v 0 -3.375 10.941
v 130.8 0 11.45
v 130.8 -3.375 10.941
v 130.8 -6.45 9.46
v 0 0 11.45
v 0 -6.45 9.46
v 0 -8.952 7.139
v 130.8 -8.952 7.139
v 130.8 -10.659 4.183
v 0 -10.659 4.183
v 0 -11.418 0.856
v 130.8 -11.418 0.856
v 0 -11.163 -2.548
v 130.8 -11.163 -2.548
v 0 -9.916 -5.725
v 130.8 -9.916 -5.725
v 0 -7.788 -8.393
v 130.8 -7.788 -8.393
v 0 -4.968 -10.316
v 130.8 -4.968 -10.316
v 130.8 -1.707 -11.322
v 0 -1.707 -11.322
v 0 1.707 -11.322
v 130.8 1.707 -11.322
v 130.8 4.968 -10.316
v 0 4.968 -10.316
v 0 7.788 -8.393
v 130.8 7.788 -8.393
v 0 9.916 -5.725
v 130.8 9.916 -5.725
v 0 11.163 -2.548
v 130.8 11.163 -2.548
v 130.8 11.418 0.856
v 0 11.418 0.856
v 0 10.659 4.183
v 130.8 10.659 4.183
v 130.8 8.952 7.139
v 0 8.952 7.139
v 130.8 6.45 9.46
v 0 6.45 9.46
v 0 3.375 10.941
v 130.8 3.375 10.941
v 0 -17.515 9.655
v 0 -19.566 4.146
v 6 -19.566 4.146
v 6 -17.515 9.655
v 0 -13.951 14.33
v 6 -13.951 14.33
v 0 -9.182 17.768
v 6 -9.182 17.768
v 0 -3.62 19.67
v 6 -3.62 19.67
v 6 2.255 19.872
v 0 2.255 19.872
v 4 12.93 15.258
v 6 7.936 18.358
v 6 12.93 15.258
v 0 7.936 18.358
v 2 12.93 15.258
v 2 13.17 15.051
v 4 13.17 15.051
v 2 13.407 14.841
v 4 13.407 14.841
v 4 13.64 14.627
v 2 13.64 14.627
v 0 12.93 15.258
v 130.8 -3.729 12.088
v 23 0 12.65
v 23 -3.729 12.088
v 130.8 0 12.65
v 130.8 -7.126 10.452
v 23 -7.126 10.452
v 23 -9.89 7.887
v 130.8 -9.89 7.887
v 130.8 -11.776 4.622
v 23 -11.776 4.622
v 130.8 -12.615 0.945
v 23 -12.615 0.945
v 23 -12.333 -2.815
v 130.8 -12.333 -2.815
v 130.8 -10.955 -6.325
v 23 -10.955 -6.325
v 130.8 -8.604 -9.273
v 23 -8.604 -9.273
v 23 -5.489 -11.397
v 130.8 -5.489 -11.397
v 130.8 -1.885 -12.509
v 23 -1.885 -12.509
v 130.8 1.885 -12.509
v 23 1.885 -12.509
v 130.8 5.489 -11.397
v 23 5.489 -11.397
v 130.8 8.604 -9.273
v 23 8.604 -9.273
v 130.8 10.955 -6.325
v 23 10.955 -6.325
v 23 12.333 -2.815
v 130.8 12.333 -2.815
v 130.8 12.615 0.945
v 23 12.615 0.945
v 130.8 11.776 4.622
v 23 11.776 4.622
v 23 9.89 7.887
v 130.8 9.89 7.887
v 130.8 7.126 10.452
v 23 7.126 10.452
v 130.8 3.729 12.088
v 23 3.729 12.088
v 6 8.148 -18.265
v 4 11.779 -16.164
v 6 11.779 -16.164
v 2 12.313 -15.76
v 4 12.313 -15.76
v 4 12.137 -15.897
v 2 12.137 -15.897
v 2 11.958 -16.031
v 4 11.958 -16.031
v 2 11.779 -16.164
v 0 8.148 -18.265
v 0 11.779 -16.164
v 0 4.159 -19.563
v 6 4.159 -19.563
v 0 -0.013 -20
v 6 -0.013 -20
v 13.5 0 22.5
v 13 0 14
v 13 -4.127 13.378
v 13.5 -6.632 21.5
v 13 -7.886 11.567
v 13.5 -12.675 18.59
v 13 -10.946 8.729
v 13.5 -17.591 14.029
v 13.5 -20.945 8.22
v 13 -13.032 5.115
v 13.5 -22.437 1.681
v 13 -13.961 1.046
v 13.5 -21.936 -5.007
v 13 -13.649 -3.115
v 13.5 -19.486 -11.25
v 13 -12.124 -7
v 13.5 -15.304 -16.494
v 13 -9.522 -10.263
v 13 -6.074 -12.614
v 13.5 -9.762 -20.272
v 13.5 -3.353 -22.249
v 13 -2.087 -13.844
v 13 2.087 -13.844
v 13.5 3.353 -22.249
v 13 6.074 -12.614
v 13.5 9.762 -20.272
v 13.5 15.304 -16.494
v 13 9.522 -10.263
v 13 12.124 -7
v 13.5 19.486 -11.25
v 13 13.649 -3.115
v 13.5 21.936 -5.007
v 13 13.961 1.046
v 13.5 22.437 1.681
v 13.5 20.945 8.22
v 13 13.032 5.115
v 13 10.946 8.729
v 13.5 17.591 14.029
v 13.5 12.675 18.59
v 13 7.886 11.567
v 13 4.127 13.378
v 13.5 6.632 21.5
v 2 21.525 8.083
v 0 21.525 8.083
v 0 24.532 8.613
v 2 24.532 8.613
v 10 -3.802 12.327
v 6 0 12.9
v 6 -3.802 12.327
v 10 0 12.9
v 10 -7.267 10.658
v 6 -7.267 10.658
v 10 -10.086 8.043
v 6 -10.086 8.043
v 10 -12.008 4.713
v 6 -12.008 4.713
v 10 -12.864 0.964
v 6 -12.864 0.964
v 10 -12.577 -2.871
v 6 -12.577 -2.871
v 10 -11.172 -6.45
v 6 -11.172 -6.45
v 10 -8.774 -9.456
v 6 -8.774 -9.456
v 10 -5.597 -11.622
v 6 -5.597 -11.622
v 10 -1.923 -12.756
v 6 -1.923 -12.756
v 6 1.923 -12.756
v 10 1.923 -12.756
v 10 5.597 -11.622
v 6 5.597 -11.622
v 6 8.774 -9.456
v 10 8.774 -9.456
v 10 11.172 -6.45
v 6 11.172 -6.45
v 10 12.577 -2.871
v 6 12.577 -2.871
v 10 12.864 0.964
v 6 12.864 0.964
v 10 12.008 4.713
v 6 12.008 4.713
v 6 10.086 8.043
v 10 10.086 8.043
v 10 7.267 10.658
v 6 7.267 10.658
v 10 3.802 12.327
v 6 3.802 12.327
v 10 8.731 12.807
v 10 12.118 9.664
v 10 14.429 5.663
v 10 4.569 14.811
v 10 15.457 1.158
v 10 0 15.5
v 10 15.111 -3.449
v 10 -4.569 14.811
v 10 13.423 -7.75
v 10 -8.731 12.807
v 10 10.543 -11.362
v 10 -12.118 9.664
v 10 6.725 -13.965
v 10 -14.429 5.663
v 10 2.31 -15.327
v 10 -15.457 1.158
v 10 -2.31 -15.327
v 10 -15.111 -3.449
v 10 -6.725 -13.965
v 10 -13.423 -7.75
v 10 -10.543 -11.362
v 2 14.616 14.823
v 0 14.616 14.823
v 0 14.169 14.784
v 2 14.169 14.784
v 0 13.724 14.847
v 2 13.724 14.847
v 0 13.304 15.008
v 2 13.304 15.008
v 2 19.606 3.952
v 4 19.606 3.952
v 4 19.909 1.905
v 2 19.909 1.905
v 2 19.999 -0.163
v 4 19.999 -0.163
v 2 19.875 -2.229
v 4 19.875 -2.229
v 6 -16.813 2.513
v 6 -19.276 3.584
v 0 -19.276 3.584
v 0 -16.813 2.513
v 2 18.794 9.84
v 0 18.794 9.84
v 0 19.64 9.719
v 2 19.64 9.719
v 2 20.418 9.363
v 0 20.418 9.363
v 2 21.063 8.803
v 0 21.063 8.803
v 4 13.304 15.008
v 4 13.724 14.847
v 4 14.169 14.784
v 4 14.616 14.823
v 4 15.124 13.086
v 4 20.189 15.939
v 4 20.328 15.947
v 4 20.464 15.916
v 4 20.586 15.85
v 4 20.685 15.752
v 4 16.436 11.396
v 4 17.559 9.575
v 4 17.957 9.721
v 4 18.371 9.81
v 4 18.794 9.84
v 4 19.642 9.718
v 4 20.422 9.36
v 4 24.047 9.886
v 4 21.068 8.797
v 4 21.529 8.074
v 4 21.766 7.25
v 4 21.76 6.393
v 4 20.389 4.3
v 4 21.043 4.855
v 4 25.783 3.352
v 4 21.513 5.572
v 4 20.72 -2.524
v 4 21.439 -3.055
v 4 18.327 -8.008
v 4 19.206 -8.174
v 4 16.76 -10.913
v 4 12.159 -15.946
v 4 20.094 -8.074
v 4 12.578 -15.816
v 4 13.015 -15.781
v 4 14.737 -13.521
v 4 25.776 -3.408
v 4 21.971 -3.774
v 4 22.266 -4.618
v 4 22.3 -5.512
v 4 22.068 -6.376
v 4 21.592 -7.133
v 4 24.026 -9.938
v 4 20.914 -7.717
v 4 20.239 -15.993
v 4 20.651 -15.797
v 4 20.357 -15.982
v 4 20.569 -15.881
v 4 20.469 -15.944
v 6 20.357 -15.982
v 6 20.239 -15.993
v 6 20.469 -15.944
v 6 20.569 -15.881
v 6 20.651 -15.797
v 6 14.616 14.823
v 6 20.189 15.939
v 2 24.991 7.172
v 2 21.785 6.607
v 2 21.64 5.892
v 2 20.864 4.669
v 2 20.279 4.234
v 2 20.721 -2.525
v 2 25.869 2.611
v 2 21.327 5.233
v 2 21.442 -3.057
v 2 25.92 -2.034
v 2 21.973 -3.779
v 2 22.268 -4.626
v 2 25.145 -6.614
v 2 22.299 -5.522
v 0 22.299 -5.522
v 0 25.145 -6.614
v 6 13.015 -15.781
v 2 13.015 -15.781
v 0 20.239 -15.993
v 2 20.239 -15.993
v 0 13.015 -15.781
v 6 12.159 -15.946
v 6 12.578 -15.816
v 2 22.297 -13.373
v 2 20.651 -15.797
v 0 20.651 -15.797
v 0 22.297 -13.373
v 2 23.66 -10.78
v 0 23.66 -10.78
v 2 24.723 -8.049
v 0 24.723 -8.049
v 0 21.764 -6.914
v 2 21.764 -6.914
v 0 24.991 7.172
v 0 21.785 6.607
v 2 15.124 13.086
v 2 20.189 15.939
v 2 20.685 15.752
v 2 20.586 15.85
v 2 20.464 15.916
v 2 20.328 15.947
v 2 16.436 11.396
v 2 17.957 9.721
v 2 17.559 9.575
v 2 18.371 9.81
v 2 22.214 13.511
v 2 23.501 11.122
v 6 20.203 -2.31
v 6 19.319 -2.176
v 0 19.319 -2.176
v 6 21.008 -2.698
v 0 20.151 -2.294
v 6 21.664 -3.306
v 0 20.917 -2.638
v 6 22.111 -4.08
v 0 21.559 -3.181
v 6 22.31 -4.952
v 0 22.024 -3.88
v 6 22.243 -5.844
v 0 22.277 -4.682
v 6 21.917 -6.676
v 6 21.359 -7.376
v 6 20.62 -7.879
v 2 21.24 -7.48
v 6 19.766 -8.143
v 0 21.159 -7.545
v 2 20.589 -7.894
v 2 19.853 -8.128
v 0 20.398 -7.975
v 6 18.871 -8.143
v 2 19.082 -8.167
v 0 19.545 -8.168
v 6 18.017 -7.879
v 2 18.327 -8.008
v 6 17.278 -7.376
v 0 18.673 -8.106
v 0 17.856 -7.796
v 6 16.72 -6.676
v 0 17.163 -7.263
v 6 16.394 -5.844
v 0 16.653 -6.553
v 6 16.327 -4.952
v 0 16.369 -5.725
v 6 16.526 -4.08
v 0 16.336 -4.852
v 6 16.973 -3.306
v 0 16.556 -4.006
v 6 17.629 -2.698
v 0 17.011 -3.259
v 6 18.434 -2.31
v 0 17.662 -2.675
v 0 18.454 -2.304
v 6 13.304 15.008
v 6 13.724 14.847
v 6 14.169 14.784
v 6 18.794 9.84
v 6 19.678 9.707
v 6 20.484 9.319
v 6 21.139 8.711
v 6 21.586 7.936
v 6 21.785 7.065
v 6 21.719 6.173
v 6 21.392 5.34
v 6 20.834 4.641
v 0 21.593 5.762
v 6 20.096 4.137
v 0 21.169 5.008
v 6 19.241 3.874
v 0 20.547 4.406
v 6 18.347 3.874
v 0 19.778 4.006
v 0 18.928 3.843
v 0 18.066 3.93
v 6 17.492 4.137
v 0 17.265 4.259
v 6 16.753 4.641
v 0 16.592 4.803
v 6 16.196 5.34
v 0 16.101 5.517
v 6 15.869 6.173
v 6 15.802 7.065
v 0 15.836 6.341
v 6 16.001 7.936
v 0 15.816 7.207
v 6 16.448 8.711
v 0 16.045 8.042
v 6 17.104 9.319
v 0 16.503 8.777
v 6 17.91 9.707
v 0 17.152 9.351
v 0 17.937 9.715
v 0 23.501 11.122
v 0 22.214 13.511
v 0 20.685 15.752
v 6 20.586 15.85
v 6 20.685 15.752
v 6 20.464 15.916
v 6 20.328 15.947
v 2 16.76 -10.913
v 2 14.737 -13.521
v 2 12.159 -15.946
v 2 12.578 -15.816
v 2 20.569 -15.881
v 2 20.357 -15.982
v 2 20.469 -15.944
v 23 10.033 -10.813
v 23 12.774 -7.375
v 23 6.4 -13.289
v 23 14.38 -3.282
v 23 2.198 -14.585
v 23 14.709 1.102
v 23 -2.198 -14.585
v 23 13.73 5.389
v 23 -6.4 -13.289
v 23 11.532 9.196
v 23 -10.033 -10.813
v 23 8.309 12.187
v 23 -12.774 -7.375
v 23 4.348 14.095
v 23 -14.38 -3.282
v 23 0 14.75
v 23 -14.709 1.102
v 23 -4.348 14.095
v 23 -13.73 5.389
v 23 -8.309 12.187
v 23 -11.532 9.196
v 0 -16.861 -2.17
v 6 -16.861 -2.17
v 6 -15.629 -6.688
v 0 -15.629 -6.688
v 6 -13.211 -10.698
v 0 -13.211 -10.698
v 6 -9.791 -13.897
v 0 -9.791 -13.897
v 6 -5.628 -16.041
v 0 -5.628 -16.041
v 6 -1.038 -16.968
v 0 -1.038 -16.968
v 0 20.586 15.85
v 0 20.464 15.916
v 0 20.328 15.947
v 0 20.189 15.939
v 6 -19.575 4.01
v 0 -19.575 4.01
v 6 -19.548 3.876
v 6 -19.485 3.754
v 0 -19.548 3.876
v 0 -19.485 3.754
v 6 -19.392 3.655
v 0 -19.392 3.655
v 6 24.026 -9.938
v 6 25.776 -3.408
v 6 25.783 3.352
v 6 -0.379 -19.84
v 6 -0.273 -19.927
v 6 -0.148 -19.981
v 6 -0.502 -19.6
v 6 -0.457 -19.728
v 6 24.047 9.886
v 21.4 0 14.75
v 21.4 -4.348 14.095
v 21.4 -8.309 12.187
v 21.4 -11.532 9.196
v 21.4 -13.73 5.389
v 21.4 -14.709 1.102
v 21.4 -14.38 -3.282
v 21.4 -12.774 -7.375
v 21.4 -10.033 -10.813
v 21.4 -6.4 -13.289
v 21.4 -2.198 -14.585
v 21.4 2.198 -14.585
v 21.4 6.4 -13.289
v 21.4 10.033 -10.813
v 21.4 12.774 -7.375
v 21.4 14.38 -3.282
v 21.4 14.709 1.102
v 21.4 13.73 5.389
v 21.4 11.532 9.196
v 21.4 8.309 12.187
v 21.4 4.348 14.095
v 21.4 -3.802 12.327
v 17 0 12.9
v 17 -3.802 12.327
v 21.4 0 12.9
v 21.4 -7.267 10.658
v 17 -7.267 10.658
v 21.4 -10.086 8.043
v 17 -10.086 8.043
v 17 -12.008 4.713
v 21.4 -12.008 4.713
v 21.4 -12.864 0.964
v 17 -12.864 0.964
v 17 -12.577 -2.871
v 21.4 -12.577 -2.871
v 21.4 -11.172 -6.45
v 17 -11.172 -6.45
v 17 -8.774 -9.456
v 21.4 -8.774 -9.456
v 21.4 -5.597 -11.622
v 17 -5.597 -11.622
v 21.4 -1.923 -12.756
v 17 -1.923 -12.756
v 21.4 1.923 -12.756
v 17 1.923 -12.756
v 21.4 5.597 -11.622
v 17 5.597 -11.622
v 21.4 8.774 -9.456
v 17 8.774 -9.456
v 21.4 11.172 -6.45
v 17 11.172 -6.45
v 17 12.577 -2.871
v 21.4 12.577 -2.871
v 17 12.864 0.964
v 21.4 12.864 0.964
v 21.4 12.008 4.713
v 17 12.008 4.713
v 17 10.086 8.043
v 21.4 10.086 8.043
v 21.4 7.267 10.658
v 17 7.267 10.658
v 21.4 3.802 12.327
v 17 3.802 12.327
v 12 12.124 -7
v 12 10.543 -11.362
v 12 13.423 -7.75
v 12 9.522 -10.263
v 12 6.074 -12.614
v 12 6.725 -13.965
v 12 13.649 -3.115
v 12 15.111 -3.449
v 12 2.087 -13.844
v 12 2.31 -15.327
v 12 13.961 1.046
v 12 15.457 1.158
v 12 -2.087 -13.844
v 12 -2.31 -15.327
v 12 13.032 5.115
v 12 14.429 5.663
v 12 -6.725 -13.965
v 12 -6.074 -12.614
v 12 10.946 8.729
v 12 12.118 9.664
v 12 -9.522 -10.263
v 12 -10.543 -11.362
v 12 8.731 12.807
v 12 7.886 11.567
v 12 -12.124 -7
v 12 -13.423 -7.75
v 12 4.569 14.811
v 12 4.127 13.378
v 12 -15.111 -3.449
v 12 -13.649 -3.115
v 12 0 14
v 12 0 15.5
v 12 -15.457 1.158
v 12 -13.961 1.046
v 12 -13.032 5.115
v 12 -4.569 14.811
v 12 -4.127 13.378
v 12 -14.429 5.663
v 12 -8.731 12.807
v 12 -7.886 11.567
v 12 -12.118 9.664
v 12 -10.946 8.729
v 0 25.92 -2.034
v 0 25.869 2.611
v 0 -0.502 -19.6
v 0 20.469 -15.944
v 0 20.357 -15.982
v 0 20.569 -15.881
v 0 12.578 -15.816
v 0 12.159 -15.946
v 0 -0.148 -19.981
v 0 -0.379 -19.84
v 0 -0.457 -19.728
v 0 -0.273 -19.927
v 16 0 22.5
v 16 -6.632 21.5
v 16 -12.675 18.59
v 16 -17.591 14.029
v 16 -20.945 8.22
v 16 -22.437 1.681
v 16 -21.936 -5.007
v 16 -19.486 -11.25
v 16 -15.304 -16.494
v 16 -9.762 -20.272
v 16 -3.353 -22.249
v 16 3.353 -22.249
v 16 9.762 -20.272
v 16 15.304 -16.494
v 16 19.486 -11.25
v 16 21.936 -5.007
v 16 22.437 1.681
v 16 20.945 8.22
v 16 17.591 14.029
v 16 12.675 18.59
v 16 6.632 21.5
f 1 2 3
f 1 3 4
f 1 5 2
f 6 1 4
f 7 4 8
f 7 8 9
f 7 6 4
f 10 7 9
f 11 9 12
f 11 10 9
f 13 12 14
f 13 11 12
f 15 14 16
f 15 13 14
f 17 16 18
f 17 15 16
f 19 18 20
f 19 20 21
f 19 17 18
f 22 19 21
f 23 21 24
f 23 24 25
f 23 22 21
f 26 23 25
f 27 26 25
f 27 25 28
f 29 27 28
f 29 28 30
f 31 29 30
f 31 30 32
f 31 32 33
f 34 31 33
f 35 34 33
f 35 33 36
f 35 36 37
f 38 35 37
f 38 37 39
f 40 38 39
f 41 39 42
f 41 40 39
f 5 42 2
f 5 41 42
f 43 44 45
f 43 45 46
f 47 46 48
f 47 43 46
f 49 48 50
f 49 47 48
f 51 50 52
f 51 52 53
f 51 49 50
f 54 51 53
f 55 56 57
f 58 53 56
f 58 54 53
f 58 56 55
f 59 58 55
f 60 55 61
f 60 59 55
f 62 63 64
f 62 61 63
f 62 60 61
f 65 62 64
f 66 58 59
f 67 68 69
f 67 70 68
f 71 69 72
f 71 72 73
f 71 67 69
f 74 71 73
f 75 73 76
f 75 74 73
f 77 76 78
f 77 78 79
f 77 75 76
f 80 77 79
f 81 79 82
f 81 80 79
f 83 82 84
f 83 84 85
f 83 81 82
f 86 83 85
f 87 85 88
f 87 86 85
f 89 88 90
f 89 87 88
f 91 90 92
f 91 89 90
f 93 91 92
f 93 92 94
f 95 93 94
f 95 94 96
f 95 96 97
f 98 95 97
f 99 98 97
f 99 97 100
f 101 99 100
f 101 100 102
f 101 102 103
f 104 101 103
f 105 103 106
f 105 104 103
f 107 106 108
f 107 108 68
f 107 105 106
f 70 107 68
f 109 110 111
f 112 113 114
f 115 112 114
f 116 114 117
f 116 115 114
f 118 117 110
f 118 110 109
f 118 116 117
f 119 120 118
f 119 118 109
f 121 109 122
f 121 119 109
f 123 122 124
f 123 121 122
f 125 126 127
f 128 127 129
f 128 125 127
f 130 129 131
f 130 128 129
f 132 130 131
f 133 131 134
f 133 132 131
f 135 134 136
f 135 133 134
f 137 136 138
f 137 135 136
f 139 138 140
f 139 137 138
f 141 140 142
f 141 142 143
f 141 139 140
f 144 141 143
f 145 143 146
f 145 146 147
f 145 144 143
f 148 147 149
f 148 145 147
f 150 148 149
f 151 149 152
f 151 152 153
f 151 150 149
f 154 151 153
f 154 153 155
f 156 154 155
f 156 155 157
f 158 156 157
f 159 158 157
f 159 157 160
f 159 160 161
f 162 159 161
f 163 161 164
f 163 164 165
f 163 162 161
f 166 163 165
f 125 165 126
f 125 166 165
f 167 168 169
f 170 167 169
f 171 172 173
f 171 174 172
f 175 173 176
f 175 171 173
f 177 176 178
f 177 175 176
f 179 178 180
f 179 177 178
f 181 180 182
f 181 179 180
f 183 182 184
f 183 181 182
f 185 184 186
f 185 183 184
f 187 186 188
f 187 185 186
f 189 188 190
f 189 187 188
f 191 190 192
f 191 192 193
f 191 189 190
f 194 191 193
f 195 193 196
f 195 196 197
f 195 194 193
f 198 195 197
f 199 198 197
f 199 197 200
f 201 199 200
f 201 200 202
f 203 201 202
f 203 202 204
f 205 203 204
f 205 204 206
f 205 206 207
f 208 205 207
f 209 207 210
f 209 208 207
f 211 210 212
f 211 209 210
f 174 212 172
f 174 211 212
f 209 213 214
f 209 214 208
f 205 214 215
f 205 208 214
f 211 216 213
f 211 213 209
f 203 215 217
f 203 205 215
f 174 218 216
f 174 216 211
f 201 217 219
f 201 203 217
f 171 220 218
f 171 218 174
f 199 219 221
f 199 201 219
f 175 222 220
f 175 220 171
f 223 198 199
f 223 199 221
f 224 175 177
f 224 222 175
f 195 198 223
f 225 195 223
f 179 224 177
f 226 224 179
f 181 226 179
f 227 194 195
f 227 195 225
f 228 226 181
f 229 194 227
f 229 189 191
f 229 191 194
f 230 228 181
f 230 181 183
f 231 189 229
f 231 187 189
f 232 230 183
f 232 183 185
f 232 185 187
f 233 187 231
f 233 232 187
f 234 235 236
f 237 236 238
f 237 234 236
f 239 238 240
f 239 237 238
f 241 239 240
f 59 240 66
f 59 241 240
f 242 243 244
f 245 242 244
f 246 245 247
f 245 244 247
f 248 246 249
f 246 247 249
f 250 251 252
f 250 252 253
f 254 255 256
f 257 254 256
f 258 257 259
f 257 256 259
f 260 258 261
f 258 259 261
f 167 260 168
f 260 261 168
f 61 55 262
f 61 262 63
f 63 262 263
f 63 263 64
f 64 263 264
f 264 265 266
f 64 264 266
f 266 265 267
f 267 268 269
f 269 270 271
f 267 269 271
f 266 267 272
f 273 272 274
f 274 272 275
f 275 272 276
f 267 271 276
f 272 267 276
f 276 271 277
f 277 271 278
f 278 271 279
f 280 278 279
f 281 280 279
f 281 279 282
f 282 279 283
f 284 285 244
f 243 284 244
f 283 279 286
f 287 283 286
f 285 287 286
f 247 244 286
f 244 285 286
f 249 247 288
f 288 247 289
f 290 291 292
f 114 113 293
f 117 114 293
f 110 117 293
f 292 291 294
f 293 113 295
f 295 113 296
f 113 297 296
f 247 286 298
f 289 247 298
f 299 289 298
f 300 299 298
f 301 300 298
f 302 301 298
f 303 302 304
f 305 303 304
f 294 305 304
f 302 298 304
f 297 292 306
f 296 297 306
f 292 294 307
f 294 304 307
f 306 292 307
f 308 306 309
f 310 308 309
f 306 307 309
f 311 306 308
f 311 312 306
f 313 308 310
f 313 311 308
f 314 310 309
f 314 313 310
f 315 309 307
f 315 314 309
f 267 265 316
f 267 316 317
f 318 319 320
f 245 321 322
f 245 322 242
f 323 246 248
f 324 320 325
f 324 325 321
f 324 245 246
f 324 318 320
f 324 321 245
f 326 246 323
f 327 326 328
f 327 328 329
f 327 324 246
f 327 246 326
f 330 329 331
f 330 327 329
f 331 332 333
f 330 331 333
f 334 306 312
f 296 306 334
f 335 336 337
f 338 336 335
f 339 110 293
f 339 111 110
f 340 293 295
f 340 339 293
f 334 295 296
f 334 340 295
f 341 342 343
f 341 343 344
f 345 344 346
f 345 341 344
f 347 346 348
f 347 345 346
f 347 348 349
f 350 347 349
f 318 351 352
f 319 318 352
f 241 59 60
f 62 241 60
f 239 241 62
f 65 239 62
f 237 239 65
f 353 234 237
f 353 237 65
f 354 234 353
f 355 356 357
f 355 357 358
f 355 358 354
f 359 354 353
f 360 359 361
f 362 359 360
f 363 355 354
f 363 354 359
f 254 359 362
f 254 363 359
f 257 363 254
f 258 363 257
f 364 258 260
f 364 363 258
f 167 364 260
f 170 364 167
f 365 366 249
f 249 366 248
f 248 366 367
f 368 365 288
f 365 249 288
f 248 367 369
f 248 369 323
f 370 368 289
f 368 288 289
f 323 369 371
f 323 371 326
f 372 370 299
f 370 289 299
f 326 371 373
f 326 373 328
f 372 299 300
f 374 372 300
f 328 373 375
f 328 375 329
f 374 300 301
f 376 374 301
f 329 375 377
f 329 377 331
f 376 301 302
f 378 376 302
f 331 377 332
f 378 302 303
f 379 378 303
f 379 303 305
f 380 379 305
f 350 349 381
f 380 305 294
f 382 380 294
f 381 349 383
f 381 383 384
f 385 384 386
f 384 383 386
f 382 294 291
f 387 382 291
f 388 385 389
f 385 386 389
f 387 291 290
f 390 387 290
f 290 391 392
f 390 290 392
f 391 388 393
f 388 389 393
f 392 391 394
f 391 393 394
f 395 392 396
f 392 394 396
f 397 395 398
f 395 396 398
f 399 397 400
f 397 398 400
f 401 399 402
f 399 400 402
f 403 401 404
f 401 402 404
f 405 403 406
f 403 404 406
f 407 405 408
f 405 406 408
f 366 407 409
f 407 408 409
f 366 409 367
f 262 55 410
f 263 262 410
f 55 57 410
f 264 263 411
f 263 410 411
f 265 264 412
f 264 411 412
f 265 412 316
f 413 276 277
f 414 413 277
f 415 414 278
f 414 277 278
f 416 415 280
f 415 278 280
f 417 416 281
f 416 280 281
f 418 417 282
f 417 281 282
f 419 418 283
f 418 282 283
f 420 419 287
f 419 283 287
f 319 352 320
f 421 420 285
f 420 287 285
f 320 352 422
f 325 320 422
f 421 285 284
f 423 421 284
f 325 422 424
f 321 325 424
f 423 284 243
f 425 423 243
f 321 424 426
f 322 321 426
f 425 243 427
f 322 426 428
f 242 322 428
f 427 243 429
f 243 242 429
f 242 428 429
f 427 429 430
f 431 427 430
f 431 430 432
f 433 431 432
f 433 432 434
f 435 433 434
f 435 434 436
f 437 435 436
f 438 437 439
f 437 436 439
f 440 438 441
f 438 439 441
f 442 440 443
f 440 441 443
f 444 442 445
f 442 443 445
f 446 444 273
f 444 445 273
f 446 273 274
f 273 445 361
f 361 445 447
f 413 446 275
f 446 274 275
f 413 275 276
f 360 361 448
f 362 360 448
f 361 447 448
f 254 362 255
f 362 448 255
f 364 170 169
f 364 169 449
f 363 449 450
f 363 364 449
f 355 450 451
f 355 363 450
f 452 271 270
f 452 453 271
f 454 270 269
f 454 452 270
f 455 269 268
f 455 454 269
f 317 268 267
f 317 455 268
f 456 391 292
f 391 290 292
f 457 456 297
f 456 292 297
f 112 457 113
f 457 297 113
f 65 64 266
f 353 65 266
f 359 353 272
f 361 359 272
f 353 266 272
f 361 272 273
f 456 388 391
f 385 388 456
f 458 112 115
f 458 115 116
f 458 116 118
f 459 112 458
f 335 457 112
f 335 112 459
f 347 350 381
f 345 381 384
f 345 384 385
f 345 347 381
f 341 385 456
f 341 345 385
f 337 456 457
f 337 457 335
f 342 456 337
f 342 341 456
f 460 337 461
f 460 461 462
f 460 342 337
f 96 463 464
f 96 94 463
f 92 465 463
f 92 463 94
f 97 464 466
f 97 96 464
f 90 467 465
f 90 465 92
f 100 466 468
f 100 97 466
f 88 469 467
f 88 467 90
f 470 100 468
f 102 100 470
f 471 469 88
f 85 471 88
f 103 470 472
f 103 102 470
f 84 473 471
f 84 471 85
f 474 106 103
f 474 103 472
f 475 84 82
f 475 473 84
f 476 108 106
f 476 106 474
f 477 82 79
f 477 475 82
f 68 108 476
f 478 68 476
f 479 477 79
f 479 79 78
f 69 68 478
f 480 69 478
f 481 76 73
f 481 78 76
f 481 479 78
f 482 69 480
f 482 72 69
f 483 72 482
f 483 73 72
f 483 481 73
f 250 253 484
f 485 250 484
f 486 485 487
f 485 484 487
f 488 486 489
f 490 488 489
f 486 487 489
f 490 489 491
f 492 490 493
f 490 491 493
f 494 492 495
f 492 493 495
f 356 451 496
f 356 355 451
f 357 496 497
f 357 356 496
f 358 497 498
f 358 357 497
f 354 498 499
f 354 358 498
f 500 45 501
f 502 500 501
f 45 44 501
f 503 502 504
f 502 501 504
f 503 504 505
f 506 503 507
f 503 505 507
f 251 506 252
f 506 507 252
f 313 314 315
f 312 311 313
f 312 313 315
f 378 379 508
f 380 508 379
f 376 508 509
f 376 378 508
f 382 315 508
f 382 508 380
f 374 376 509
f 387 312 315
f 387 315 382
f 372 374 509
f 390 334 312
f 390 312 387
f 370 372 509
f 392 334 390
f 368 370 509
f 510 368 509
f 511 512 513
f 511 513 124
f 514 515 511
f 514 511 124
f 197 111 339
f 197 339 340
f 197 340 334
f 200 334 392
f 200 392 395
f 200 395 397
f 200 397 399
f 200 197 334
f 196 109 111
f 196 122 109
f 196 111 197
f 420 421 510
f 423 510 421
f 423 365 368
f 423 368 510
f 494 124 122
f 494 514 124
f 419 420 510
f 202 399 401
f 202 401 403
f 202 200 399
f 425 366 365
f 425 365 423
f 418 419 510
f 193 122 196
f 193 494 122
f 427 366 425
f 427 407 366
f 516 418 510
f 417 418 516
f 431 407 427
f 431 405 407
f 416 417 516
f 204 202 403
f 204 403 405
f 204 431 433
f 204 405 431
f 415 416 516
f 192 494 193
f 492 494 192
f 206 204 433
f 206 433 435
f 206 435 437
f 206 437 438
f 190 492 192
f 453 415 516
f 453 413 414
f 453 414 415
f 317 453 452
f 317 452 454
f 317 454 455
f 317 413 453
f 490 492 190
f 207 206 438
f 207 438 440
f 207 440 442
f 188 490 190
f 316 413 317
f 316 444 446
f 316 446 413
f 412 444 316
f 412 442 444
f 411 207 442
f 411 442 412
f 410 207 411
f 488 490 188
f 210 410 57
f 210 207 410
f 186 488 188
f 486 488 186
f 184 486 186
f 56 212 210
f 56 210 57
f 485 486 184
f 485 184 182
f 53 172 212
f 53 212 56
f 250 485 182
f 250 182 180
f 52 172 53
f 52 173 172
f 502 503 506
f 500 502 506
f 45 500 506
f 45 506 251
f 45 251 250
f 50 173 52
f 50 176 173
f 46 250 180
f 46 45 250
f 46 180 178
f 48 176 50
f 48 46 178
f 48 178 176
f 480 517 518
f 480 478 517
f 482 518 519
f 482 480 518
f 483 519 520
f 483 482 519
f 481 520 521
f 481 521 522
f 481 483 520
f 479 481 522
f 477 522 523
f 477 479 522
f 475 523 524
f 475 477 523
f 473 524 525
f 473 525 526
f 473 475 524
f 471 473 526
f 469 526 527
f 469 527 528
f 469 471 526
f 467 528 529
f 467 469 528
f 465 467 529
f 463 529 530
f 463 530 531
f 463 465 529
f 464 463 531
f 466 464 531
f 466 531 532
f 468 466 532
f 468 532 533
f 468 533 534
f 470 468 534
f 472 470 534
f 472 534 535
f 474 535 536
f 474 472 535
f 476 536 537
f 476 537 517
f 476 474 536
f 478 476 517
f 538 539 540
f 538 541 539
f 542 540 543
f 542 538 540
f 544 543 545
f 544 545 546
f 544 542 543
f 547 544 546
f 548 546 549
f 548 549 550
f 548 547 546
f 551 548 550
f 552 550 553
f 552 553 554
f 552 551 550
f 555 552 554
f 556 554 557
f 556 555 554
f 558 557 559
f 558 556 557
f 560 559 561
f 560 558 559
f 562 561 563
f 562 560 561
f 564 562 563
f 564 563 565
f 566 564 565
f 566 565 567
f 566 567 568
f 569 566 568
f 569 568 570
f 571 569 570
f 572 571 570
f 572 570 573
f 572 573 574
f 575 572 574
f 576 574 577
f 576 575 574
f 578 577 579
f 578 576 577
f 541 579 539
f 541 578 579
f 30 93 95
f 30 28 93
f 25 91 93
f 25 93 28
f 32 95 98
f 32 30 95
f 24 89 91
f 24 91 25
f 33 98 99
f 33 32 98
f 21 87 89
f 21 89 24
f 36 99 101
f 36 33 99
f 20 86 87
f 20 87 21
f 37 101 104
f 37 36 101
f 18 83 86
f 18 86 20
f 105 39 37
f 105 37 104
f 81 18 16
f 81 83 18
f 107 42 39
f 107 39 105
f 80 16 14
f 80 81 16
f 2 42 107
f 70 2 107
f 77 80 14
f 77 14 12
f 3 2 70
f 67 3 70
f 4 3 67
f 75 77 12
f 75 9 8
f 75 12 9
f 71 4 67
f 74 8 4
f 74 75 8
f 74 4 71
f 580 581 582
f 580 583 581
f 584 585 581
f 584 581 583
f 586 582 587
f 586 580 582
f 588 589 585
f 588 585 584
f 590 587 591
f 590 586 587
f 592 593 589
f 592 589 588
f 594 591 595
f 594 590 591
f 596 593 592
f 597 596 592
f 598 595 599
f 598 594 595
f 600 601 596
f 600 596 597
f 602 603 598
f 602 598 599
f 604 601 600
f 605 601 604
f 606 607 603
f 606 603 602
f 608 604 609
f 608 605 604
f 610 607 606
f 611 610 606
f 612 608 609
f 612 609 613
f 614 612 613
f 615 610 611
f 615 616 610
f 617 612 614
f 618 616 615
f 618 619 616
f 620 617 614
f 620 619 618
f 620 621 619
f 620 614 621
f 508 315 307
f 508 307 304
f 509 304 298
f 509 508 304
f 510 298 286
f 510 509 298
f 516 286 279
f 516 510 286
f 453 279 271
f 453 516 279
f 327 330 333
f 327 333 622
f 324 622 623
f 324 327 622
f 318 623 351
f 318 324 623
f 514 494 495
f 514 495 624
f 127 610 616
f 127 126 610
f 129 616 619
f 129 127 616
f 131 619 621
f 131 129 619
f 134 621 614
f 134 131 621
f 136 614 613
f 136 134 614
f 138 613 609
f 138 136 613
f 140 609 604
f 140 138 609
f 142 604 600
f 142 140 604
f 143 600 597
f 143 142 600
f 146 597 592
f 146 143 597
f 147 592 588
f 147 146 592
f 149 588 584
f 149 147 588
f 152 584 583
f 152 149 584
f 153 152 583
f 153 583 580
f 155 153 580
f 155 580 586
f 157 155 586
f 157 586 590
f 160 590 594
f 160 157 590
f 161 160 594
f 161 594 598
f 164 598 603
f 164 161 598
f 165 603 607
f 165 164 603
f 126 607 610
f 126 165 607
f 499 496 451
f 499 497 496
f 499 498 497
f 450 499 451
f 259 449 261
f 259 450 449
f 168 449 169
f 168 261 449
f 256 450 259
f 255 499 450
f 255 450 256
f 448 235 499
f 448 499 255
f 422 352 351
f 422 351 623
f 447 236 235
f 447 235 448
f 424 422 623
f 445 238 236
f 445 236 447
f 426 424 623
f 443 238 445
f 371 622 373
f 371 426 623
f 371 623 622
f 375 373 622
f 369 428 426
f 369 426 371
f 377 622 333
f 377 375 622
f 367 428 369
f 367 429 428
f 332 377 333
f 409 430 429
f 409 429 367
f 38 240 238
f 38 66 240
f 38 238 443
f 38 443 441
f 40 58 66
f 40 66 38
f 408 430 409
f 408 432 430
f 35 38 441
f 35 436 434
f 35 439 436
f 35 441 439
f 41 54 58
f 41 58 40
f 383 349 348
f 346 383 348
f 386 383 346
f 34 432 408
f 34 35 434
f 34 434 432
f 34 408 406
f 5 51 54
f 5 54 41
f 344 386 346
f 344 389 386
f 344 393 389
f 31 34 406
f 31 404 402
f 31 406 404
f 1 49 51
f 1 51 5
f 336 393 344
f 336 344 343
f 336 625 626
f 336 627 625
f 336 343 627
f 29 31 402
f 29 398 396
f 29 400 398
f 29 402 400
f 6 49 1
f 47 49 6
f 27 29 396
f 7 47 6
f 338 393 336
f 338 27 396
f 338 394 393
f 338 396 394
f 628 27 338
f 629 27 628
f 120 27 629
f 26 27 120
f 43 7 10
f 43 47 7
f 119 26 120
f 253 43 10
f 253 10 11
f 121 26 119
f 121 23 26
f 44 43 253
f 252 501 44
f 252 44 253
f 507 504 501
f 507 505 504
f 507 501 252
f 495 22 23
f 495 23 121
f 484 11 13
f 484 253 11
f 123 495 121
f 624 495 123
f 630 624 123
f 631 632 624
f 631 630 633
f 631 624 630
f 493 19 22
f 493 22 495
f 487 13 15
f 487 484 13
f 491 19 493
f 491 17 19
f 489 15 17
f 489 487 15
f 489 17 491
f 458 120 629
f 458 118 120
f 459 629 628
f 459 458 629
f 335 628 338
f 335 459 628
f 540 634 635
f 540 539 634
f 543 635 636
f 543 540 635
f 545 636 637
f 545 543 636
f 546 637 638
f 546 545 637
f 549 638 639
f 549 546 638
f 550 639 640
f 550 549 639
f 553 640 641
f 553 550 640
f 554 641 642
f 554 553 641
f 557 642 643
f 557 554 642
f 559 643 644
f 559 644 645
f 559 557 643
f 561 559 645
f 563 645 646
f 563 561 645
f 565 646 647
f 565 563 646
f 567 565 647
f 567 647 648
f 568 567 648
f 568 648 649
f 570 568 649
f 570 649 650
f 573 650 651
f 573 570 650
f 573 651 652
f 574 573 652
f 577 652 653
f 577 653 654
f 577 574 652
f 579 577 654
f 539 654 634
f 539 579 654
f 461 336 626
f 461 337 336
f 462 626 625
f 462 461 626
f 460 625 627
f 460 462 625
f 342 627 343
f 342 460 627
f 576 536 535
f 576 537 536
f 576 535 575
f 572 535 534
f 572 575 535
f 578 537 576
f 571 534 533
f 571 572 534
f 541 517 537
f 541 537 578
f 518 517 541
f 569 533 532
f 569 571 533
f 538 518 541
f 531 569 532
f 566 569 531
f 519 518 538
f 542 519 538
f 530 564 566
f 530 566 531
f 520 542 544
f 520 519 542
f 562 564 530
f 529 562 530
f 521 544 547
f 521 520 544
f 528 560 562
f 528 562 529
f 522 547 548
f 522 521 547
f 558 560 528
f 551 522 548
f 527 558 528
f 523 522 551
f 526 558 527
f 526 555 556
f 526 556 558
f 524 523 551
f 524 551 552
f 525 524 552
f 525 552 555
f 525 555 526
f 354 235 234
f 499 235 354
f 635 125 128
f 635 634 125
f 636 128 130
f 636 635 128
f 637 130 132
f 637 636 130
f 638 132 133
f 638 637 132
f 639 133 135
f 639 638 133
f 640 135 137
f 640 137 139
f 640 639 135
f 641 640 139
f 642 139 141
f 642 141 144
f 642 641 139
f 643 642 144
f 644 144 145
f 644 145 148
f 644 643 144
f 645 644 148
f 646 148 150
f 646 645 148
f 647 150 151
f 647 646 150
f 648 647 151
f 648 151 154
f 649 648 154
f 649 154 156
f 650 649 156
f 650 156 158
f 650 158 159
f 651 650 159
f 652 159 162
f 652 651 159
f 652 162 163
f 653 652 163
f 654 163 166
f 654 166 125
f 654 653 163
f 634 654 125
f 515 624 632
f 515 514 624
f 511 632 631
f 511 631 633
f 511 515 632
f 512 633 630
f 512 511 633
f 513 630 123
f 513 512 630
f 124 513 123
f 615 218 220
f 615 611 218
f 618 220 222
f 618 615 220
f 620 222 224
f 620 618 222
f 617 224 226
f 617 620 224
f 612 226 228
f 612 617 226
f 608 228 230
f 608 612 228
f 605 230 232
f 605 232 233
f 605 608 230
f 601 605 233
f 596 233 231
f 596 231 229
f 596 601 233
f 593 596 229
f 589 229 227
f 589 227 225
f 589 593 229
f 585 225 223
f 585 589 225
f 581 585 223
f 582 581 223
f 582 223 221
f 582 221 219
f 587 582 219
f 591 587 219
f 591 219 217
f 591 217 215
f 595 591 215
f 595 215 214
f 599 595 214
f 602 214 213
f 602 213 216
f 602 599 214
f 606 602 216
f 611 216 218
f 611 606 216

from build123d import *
from build123d.topology import SkipClean

# Parameters (mm, degrees)
SKETCH5_W          = 2
SKETCH5_H          = 25
SKETCH2_R          = 3
CUT_EXTRUDE1_DEPTH = 6
FILLET1_R          = 2
CUT_EXTRUDE2_DEPTH = 6
FILLET2_R          = 0.5
CUT_EXTRUDE3_REACH = 132.8


with BuildPart() as part:
    # Sketch1 → Revolve1 (revolve)
    with BuildSketch(Plane.XY, mode=Mode.PRIVATE) as revolve1_sk:
        Polygon((130.8, 11.45), (0, 11.45), (0, 26), (6, 26), (6, 12.9), (10, 12.9), (10, 15.5), (12, 15.5), (12, 14), (13, 14), (13.5, 22.5), (16, 22.5), (17, 12.9), (21.4, 12.9), (21.4, 14.75), (23, 14.75), (23, 12.65), (130.8, 12.65), align=None)
    revolve(revolve1_sk.sketch.rotate(Axis((0, 0, 0), (1, 0, 0)), 90), axis=Axis((0, 0, 0), (1, 0, 0)))  # turned: the seam where the file's is

    # Sketch5 → Cut-Revolve1 (revolve, cut)
    with BuildSketch(Plane.XY, mode=Mode.PRIVATE) as cut_revolve1_sk:
        with Locations((3, 32.5)):
            Rectangle(SKETCH5_W, SKETCH5_H)
    revolve(cut_revolve1_sk.sketch.rotate(Axis((0, 0, 0), (-1, 0, 0)), 270), axis=Axis((0, 0, 0), (-1, 0, 0)), mode=Mode.SUBTRACT)  # turned: the seam where the file's is

    # Sketch2 → Cut-Extrude1 (cut)
    with SkipClean():  # keep this step's faces unmerged: merging them makes the solid invalid here
        with BuildSketch(Plane.ZY):
            with Locations((-5.176381, 19.318517)):
                Circle(SKETCH2_R)
            with Locations((6.840403, 18.793852)):
                Circle(SKETCH2_R)
            with BuildLine():
                Line((14.627074, 13.639967), (16, 20.493902))
                ThreePointArc((16, 20.493902), (0, -26), (-16, 20.493902))
                Line((-16, 20.493902), (-15.760215, 12.31323))
                ThreePointArc((-15.760215, 12.31323), (0.872388, -19.980964), (14.627074, 13.639967))
            make_face()
        extrude(amount=-CUT_EXTRUDE1_DEPTH, mode=Mode.SUBTRACT)

    # Fillet1
    fillet1_edges = [part.edges().sort_by_distance(p)[0] for p in [
        (1, 12.31323, -15.760215),
        (5, 12.31323, -15.760215),
        (1, 13.639967, 14.627074),
        (5, 13.639967, 14.627074),
    ]]
    fillet(fillet1_edges, radius=FILLET1_R)

    # Sketch3 → Cut-Extrude2 (cut)
    with SkipClean():  # keep this step's faces unmerged: merging them makes the solid invalid here
        with BuildSketch(Plane.ZY):
            with BuildLine():
                Line((-16.968292, -1.037825), (-19.995549, -0.421923))
                ThreePointArc((-19.995549, -0.421923), (-12.586408, -15.542919), (3.744606, -19.646321))
                Line((3.744606, -19.646321), (2.51276, -16.81327))
                ThreePointArc((2.51276, -16.81327), (-10.698447, -13.211481), (-16.968292, -1.037825))
            make_face()
        extrude(amount=-CUT_EXTRUDE2_DEPTH, mode=Mode.SUBTRACT)

    # Fillet2
    fillet2_edges = [part.edges().sort_by_distance(p)[0] for p in [
        (3, -19.646321, 3.744606),
        (3, -0.421923, -19.995549),
        (1, 20.493902, 16),
        (5, 20.493902, 16),
        (1, 20.493902, -16),
        (5, 20.493902, -16),
    ]]
    fillet(fillet2_edges, radius=FILLET2_R)

    # Sketch4 → Cut-Extrude3 (cut, up to next)
    with BuildSketch(Plane.ZY, mode=Mode.PRIVATE) as cut_extrude3_sk1:
        Polygon((-5.843402, 18.975614), (-4.509359, 19.661419), (-10.480395, 35.216499), (-11.814438, 34.530693), align=None)
    cut_extrude3_tool1 = extrude(cut_extrude3_sk1.sketch, amount=-CUT_EXTRUDE3_REACH, mode=Mode.PRIVATE) & part.part
    add(cut_extrude3_tool1.solids().sort_by_distance((0, 27.096056, -8.161899))[0], mode=Mode.SUBTRACT)
    # Sketch4 → Cut-Extrude3 (cut, up to next)
    with BuildSketch(Plane.ZY, mode=Mode.PRIVATE) as cut_extrude3_sk2:
        Polygon((6.108448, 18.957382), (7.572358, 18.630323), (10.539953, 35.460393), (9.076043, 35.787451), align=None)
    cut_extrude3_tool2 = extrude(cut_extrude3_sk2.sketch, amount=-CUT_EXTRUDE3_REACH, mode=Mode.PRIVATE) & part.part
    add(cut_extrude3_tool2.solids().sort_by_distance((0, 27.208887, 8.324201))[0], mode=Mode.SUBTRACT)


solid = part.part
